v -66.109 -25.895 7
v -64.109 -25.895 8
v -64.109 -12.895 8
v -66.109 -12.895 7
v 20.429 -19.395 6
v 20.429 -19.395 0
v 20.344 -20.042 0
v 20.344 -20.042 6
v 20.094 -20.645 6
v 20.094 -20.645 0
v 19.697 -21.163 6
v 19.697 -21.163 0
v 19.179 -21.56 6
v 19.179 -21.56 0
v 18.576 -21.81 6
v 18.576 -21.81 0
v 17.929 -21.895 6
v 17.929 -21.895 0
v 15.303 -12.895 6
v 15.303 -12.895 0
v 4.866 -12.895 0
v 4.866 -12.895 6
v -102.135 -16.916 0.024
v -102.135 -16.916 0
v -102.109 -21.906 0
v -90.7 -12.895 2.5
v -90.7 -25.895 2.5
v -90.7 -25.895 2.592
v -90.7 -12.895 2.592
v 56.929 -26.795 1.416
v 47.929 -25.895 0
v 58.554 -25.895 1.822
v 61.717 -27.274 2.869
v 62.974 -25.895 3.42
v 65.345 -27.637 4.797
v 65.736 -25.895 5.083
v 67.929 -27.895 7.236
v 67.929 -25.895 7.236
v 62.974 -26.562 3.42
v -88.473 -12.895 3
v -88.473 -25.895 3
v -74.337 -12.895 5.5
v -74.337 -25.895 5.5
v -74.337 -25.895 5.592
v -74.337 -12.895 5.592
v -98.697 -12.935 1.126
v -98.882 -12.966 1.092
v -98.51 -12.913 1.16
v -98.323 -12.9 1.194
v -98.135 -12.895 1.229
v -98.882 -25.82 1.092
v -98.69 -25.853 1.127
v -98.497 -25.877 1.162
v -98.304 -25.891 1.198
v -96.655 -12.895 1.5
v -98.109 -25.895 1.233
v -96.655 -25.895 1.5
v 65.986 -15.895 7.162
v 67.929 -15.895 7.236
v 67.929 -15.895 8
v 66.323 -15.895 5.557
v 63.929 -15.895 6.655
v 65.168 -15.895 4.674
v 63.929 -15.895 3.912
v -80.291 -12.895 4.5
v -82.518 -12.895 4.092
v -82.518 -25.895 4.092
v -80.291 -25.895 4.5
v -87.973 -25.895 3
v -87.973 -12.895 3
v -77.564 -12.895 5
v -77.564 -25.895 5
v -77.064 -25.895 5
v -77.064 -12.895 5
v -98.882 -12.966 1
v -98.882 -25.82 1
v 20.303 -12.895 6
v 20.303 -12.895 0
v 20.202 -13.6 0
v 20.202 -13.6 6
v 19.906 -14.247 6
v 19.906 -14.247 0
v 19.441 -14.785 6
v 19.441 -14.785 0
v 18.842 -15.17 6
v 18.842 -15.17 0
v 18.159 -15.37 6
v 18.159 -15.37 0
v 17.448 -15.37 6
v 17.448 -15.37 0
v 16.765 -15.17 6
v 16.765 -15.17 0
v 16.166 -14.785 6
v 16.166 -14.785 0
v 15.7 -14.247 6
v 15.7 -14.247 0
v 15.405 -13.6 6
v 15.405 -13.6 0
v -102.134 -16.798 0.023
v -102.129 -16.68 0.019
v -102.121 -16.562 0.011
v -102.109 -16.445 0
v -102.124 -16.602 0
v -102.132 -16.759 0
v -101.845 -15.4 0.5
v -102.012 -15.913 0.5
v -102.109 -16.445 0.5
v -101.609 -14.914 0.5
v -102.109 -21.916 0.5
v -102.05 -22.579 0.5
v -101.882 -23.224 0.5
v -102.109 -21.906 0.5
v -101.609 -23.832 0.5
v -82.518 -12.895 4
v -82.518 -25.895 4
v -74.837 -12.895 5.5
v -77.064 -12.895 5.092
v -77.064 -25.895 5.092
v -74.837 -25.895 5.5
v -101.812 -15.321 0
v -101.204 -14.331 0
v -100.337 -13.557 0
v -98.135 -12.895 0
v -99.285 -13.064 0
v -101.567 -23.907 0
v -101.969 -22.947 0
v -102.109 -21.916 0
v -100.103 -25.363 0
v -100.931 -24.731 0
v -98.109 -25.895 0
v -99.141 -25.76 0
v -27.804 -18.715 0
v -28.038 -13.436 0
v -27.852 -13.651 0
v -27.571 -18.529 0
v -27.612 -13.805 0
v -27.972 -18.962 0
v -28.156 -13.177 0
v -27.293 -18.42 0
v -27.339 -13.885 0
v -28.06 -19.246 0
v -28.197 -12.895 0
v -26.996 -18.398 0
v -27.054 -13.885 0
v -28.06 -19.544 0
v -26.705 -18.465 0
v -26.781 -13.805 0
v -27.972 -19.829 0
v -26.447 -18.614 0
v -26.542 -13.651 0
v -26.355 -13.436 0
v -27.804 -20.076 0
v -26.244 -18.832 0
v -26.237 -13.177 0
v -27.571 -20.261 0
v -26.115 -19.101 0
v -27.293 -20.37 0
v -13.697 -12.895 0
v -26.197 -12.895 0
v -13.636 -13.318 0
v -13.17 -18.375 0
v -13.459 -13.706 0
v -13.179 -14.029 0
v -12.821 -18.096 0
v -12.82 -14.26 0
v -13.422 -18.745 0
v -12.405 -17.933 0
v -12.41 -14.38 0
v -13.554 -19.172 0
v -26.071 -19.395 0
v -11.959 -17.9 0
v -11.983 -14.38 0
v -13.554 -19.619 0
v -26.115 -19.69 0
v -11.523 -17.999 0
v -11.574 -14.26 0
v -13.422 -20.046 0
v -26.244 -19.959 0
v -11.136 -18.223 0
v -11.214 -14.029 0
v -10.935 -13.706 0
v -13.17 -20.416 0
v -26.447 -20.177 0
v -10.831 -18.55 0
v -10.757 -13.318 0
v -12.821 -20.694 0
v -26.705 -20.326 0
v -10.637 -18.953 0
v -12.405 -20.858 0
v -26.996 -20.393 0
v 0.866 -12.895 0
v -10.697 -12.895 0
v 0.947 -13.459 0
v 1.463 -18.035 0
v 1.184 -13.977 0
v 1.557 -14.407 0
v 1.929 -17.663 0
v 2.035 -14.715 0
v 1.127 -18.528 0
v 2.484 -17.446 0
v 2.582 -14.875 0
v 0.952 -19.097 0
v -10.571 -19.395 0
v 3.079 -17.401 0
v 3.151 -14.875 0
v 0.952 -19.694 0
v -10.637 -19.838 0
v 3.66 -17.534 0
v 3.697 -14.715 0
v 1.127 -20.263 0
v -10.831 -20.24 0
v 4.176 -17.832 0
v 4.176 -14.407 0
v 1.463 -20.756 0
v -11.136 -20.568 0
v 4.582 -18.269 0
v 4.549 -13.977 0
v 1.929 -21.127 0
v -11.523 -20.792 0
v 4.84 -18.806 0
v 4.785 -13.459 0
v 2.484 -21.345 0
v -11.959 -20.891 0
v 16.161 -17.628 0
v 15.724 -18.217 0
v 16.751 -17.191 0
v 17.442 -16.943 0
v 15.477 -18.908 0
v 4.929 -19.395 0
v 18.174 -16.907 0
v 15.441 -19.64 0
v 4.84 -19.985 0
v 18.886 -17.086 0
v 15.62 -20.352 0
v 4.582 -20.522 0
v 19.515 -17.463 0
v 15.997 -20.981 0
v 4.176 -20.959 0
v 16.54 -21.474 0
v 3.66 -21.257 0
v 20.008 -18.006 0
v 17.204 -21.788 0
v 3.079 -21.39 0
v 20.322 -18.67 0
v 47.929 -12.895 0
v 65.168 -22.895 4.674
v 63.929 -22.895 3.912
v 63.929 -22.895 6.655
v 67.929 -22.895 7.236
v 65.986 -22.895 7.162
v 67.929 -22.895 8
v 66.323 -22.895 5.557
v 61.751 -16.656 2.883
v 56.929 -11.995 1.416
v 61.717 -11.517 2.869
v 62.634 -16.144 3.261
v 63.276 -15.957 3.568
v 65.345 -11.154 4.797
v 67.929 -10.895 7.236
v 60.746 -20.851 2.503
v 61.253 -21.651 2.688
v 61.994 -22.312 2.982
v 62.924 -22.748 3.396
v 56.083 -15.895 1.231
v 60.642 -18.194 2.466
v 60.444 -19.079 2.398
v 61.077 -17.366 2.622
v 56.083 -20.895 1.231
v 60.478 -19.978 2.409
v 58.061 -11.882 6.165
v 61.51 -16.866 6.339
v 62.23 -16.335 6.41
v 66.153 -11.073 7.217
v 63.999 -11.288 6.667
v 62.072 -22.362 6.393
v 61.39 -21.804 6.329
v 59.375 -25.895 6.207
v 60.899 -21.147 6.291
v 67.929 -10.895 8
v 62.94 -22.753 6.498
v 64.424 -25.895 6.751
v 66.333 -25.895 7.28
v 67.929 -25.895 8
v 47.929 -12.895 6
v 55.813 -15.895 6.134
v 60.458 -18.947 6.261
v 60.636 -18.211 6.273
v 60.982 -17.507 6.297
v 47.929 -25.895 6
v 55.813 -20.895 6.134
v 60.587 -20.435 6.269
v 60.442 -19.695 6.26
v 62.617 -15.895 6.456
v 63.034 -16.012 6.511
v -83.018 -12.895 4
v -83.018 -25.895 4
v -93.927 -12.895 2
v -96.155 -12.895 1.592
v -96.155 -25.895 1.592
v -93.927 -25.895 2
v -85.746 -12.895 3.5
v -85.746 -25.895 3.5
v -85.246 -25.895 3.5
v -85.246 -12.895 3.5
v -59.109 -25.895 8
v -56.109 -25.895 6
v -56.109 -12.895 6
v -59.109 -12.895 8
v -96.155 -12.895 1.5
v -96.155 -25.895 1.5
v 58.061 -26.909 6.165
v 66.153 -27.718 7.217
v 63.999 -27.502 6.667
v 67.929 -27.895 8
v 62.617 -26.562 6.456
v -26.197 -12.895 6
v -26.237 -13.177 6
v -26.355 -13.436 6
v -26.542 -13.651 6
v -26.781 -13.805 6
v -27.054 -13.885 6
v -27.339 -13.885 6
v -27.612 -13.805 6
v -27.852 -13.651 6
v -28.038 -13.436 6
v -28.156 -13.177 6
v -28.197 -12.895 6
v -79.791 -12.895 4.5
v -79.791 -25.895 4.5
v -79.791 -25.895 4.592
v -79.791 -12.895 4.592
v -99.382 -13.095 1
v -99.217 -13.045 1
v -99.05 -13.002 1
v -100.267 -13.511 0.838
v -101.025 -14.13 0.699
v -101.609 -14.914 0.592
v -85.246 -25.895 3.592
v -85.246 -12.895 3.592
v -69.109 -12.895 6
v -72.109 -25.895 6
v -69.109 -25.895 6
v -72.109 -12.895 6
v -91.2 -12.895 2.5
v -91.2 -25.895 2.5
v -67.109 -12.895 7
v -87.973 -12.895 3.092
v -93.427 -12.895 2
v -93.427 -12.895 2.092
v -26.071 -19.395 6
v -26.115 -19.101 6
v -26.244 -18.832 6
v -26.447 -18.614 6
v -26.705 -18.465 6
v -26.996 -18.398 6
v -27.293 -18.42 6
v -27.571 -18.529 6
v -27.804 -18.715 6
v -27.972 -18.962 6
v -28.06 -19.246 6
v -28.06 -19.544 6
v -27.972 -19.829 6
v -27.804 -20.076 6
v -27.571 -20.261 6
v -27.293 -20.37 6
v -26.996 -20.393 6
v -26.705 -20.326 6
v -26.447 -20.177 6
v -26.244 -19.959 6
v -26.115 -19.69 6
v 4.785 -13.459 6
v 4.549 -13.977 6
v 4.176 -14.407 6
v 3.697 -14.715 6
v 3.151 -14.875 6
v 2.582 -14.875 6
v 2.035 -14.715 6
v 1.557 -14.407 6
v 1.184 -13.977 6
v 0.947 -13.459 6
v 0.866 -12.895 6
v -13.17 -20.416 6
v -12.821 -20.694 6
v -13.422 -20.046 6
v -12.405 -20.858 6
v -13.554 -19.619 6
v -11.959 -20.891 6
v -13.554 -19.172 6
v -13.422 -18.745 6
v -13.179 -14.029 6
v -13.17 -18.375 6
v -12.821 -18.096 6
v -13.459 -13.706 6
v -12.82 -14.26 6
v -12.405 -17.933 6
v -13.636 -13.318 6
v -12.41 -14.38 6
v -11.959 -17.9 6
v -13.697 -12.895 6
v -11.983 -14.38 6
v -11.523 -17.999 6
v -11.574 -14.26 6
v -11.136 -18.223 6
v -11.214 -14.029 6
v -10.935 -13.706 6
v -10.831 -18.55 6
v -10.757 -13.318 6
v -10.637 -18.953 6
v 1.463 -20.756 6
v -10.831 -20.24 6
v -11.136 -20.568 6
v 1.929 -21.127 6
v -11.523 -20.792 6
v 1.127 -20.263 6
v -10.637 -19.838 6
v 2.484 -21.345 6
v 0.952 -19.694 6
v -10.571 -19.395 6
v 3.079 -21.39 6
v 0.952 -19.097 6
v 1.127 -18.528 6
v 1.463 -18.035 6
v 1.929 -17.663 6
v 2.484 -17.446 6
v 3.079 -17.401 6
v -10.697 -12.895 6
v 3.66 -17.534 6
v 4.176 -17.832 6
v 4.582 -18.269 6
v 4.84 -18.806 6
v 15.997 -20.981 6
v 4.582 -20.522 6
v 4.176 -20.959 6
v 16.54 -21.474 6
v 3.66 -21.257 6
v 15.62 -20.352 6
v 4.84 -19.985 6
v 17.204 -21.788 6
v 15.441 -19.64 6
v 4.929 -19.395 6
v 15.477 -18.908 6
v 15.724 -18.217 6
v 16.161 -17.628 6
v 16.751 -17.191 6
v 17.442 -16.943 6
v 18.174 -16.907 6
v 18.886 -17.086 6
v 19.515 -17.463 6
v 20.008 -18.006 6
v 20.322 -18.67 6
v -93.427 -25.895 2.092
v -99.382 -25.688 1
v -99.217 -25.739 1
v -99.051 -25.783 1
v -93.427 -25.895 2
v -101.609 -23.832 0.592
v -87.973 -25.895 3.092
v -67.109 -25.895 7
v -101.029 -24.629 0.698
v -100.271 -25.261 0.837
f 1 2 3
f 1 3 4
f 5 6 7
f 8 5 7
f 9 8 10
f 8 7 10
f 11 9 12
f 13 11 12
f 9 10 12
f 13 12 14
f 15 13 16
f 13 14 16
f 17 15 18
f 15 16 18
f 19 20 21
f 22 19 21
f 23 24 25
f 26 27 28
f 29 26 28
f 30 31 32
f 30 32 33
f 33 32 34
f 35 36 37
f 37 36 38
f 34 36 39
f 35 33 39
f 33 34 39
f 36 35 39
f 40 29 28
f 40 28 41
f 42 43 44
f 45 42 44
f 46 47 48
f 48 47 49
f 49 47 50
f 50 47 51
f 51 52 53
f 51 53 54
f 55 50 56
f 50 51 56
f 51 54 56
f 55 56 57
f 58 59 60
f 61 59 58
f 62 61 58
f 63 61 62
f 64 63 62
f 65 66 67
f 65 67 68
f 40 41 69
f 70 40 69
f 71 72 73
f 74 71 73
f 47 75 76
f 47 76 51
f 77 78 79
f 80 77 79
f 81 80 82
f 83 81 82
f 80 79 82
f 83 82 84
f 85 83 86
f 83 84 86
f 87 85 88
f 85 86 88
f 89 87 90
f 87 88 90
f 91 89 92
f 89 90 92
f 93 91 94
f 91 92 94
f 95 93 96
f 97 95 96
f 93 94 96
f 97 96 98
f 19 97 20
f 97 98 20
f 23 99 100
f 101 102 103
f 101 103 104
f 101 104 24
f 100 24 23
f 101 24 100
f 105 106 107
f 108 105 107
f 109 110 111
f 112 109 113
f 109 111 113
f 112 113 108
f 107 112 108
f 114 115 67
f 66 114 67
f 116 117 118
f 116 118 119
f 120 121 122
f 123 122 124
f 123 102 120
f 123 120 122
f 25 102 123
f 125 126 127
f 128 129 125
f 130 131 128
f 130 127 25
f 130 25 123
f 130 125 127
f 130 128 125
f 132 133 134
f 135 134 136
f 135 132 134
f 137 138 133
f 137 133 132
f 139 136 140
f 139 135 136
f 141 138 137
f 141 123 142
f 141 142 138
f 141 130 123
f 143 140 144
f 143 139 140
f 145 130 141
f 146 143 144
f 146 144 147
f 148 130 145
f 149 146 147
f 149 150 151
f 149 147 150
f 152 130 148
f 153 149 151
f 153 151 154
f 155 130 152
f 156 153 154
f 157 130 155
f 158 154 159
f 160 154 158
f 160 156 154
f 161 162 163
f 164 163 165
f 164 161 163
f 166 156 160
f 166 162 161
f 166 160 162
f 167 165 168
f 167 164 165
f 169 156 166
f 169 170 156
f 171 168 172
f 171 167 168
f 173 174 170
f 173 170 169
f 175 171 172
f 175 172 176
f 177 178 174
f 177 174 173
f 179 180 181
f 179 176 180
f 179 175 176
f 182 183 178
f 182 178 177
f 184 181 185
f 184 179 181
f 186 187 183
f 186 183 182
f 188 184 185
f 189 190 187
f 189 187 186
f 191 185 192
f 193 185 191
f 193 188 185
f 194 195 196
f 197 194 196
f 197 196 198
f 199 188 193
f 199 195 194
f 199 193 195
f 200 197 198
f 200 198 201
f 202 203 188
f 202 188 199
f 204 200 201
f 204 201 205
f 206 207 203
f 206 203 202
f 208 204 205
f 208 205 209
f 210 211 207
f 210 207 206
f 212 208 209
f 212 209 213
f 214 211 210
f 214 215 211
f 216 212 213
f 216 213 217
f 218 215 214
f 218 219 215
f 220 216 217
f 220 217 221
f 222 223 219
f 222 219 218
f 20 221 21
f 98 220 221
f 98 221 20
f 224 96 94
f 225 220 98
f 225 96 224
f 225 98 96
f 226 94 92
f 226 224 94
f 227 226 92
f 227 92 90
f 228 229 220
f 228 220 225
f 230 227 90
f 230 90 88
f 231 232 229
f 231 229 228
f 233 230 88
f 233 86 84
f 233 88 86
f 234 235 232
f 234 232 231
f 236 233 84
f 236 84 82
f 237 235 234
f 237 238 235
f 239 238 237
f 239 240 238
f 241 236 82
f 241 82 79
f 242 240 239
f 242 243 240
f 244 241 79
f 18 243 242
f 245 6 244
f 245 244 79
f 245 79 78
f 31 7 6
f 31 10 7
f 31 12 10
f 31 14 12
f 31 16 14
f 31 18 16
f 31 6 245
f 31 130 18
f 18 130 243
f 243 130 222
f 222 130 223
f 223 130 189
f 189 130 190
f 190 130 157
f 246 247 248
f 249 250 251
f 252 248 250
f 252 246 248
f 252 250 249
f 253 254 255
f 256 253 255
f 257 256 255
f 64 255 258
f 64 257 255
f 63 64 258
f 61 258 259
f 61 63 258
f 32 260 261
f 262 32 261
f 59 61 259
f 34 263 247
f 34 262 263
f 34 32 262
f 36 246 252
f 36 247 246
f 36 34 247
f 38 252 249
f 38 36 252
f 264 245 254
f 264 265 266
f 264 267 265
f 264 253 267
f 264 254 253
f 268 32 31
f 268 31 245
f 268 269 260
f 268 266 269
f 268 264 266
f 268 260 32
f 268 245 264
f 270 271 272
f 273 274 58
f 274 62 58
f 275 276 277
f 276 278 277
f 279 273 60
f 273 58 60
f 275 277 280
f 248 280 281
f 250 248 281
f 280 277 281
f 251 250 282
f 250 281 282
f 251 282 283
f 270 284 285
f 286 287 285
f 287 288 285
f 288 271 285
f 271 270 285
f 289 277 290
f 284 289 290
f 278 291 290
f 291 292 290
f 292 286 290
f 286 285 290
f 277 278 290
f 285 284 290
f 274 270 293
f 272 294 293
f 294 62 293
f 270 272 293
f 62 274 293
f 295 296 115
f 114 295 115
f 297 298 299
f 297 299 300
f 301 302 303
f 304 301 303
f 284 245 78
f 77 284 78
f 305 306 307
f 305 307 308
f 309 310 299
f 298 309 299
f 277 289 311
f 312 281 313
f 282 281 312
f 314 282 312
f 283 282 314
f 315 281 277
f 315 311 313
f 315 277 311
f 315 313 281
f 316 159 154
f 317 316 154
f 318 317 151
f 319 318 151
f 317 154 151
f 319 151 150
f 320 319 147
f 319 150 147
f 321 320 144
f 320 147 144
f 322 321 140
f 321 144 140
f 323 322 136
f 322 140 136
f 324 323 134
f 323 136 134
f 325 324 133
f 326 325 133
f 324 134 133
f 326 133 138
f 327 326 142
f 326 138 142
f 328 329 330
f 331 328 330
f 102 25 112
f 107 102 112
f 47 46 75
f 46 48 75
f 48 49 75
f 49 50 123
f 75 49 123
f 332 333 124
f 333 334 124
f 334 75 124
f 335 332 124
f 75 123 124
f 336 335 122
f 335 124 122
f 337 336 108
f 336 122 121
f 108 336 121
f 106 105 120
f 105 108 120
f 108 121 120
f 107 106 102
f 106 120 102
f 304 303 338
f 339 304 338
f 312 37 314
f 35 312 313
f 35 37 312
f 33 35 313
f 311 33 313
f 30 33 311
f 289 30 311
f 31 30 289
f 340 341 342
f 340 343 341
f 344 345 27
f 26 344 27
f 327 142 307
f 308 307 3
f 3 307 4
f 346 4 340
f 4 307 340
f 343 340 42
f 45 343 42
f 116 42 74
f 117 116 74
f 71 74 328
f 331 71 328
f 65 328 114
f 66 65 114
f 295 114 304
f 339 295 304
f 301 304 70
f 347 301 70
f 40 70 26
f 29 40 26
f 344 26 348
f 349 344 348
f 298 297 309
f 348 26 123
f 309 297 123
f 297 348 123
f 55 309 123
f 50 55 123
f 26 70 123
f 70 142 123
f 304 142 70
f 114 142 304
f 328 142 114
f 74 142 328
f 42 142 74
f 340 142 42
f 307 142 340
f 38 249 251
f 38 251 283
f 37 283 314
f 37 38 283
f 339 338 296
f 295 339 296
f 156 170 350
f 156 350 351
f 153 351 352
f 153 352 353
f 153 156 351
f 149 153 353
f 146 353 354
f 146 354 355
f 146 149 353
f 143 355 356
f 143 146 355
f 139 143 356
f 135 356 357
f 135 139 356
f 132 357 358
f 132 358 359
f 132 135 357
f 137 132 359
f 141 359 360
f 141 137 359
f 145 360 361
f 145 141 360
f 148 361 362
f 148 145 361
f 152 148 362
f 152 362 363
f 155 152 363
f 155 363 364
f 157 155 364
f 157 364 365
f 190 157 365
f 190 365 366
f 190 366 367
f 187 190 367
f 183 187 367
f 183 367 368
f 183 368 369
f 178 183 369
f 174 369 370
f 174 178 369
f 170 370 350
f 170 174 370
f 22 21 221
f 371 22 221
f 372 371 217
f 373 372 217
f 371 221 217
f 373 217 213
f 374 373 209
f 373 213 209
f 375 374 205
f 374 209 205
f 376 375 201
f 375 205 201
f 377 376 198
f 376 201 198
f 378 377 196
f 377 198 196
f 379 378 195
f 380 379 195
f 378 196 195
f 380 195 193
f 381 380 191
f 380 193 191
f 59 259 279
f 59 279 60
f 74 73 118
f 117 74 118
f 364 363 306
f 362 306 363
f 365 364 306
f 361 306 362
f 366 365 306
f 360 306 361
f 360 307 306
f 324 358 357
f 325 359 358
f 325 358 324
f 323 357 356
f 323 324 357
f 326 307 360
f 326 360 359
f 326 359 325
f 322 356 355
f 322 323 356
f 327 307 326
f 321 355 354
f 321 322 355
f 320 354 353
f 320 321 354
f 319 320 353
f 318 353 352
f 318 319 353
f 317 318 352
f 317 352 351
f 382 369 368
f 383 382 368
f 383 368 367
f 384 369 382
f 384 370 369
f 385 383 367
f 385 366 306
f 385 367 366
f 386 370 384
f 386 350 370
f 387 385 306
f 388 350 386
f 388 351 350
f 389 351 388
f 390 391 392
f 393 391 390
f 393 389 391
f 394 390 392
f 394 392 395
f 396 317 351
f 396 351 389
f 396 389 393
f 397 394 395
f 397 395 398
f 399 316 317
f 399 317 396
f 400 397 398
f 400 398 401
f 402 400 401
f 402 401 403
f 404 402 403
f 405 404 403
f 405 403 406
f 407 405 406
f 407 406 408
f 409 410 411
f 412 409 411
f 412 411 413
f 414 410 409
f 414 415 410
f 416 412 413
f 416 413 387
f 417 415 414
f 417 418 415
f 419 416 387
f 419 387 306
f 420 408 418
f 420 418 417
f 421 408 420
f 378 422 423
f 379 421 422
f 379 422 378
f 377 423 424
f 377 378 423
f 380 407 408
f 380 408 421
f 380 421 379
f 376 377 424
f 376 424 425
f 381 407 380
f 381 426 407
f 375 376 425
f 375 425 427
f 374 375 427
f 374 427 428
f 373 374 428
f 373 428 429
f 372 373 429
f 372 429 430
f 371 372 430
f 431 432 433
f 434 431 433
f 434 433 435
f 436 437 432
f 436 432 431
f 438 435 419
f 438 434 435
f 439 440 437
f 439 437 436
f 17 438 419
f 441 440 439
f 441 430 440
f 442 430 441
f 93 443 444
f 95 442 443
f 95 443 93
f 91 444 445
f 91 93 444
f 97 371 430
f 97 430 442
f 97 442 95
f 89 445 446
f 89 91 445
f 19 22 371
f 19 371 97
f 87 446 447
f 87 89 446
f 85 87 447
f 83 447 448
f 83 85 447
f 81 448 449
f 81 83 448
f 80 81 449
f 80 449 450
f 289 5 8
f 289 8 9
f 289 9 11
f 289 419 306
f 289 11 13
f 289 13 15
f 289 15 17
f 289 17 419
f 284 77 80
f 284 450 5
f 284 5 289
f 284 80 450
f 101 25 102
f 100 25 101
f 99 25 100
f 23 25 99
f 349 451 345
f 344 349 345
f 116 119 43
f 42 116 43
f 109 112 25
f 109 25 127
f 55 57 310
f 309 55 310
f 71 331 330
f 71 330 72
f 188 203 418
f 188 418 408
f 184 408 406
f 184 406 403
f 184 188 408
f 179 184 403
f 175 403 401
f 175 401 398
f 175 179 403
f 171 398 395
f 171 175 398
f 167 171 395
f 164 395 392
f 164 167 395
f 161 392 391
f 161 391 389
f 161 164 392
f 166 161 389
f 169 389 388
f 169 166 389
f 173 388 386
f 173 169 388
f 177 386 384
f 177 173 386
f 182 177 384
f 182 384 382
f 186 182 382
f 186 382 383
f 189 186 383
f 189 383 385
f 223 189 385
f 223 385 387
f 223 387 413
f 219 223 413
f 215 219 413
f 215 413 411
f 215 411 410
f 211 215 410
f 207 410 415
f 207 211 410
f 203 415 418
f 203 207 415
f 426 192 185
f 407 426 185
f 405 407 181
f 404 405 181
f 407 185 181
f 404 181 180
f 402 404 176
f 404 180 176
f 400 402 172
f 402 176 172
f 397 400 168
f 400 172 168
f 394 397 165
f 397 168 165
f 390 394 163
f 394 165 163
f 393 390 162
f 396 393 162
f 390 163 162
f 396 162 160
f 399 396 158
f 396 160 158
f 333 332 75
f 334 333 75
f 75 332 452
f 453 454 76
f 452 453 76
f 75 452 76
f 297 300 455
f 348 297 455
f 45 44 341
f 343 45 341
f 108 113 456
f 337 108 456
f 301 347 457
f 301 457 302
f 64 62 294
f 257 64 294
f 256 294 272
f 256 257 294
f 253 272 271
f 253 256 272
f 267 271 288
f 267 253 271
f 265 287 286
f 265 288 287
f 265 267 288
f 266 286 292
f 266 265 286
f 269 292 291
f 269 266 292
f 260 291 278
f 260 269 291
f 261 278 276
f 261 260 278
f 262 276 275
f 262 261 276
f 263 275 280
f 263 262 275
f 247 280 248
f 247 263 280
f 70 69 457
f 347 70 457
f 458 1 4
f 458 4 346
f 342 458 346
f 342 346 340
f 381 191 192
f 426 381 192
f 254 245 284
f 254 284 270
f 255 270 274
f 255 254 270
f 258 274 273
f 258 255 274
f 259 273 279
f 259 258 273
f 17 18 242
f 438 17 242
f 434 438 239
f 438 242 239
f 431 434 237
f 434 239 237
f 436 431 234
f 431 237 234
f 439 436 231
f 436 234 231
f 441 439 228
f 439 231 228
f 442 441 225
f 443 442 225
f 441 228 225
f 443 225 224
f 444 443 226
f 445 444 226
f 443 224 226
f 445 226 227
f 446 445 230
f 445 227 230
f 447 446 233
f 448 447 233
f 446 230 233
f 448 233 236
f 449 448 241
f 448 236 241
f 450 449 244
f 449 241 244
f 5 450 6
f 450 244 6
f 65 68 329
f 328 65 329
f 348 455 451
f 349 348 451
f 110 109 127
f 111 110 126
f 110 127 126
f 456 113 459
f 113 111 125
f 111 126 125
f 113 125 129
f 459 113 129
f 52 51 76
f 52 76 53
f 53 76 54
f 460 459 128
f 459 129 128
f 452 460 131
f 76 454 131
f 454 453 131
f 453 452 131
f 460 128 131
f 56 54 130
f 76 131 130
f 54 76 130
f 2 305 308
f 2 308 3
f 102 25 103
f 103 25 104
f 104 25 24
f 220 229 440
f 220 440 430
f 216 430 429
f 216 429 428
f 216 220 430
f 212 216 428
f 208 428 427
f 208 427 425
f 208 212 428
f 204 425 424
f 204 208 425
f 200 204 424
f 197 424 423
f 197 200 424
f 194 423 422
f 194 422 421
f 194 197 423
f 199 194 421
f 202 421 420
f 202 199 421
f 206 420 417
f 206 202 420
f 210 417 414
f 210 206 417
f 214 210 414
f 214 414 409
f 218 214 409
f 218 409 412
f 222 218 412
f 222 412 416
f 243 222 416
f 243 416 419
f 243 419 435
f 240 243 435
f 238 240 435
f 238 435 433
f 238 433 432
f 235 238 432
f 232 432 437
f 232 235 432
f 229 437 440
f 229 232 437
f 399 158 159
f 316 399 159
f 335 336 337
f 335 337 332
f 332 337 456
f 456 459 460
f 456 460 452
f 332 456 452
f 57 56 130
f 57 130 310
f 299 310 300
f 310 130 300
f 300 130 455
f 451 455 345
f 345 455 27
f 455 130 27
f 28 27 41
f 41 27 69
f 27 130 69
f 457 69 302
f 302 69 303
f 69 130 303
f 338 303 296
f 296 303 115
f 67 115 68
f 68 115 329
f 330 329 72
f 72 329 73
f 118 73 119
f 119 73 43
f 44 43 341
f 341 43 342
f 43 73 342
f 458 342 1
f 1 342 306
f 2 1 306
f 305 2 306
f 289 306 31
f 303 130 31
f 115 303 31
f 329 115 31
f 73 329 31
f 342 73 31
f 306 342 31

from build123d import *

# Parameters (mm, degrees)
F0_R          = 1
F0_R_2        = 1.5
F0_R_3        = 2
F1_DEPTH      = 6
F3_DEPTH      = 8
F5_DEPTH      = 25
F5_DEPTH_BACK = 25
F7_DEPTH      = 25
F9_DEPTH      = 13


# Not quite as in the source:
# - a feature names something its author has since deleted; it is built from what else it names


with BuildPart() as f1:
    # F0 (on Top) → F1 (new body)
    with BuildSketch(Plane.XY):
        with BuildLine():
            Line((-42.1966487169, -12.8954221606), (-42.1966487169, -25.8954221606))
            Line((-42.1966487169, -25.8954221606), (17.9292613268, -25.8954221606))
            Line((17.9292613268, -25.8954221606), (47.9292613268, -25.8954221606))
            Line((47.9292613268, -25.8954221606), (47.9292613268, -12.8954221606))
            Line((47.9292613268, -12.8954221606), (20.3033512831, -12.8954221606))
            ThreePointArc((20.3033512831, -12.8954221606), (17.8033512831, -15.3954221606), (15.3033512831, -12.8954221606))
            Line((15.3033512831, -12.8954221606), (4.8663063049, -12.8954221606))
            ThreePointArc((4.8663063049, -12.8954221606), (2.8663063049, -14.8954221606), (0.8663063049, -12.8954221606))
            Line((0.8663063049, -12.8954221606), (-10.6966487169, -12.8954221606))
            ThreePointArc((-10.6966487169, -12.8954221606), (-12.1966487169, -14.3954221606), (-13.6966487169, -12.8954221606))
            Line((-13.6966487169, -12.8954221606), (-26.1966487169, -12.8954221606))
            ThreePointArc((-26.1966487169, -12.8954221606), (-27.1966487169, -13.8954221606), (-28.1966487169, -12.8954221606))
            Line((-28.1966487169, -12.8954221606), (-42.1966487169, -12.8954221606))
        make_face()
        with Locations((-27.0707386732, -19.3954221606)):
            Circle(F0_R, mode=Mode.SUBTRACT)
        with Locations((-12.0707386732, -19.3954221606)):
            Circle(F0_R_2, mode=Mode.SUBTRACT)
        with Locations((2.9292613268, -19.3954221606)):
            Circle(F0_R_3, mode=Mode.SUBTRACT)
        with BuildLine():
            ThreePointArc((20.4292613268, -19.3954221606), (19.6970282798, -21.1631891136), (17.9292613268, -21.8954221606))
            ThreePointArc((17.9292613268, -21.8954221606), (16.1614943738, -17.6276552077), (20.4292613268, -19.3954221606))
        make_face(mode=Mode.SUBTRACT)
        with BuildLine():
            ThreePointArc((-102.1092408178, -21.9157785711), (-100.9305134828, -24.7310372299), (-98.109292616, -25.8954221606))
            Line((-98.109292616, -25.8954221606), (-42.1966487169, -25.8954221606))
            Line((-42.1966487169, -25.8954221606), (-42.1966487169, -12.8954221606))
            Line((-42.1966487169, -12.8954221606), (-98.1347384587, -12.8954221606))
            ThreePointArc((-98.1347384587, -12.8954221606), (-100.9703535279, -14.0742012939), (-102.1346866604, -16.9157785711))
            Line((-102.1346866604, -16.9157785711), (-102.1092408178, -21.9157785711))
        make_face()
    extrude(amount=F1_DEPTH)

    # F2 (on face) → F3 (join)
    with BuildSketch(Plane(origin=(0, 0, 0), x_dir=(1, 0, 0), z_dir=(0, 0, -1))):
        with BuildLine():
            Line((47.9292613268, 25.8954221606), (47.9292613268, 12.8954221606))
            Line((47.9292613268, 12.8954221606), (67.9292613268, 10.8954221606))
            Line((67.9292613268, 10.8954221606), (67.9292613268, 15.8954221606))
            Line((67.9292613268, 15.8954221606), (63.9292613268, 15.8954221606))
            ThreePointArc((63.9292613268, 15.8954221606), (60.4292613268, 19.3954221606), (63.9292613268, 22.8954221606))
            Line((63.9292613268, 22.8954221606), (67.9292613268, 22.8954221606))
            Line((67.9292613268, 22.8954221606), (67.9292613268, 27.8954221606))
            Line((67.9292613268, 27.8954221606), (47.9292613268, 25.8954221606))
        make_face()
    extrude(amount=-F3_DEPTH)

    # F4 (on face) → F5 (cut, two sides)
    with BuildSketch(Plane.XZ.offset(25.8954221606)) as f5_sk:
        with BuildLine():
            Line((46.540889889, 6), (47.9292613268, 6))
            add(Edge.make_bspline(
                [(47.9292613268, 6), (56.2153583024, 6.3852668293), (63.4993069571, 5.4990063105), (67.9292613268, 8)],
                knots=[0, 0, 0, 0, 0.5891408943, 0.5891408943, 0.5891408943, 0.5891408943], degree=3))
            add(Edge.make_bspline(
                [(67.9292613268, 8), (68.2487173743, 8.1803534511), (68.5533319552, 8.3783214507), (68.8425013824, 8.5922158425)],
                knots=[0.5891408943, 0.5891408943, 0.5891408943, 0.5891408943, 0.6316254451, 0.6316254451, 0.6316254451, 0.6316254451], degree=3))
            add(Edge.make_bspline(
                [(68.8425013824, 8.5922158425), (70.5907749543, 11.5561393325), (71.3452296215, 15.074575864), (72.5077323308, 15.8934572506)],
                knots=[0.4687959677, 0.4687959677, 0.4687959677, 0.4687959677, 0.7089887452, 0.7089887452, 0.7089887452, 0.7089887452], degree=3))
            add(Edge.make_bspline(
                [(72.5077323308, 15.8934572506), (72.5145030374, 15.8982266206), (72.5212875857, 15.9029044167), (72.5280862528, 15.9074899958)],
                knots=[0.7089887452, 0.7089887452, 0.7089887452, 0.7089887452, 0.710387688, 0.710387688, 0.710387688, 0.710387688], degree=3))
            Line((72.5280862528, 15.9074899958), (72.5280862528, 21.5322930813))
            Line((72.5280862528, 21.5322930813), (47.9292613268, 21.5322930813))
            Line((47.9292613268, 21.5322930813), (46.540889889, 21.5322930813))
            Line((46.540889889, 21.5322930813), (46.540889889, 6))
        make_face()
        with BuildLine():
            add(Edge.make_bspline(
                [(47.9292613268, 0), (56.4914134681, 0.9755749136), (64.1655487647, 2.3840198172), (67.9292613268, 7.2357458994)],
                knots=[0, 0, 0, 0, 0.4306699839, 0.4306699839, 0.4306699839, 0.4306699839], degree=3))
            Line((47.9292613268, 0), (47.9292613268, -3.928697668))
            Line((47.9292613268, -3.928697668), (72.5280862528, -3.928697668))
            Line((72.5280862528, -3.928697668), (72.5280862528, 15.9074899958))
            add(Edge.make_bspline(
                [(72.5077323308, 15.8934572506), (72.5145030374, 15.8982266206), (72.5212875857, 15.9029044167), (72.5280862528, 15.9074899958)],
                knots=[0.7089887452, 0.7089887452, 0.7089887452, 0.7089887452, 0.710387688, 0.710387688, 0.710387688, 0.710387688], degree=3))
            add(Edge.make_bspline(
                [(68.8425013824, 8.5922158425), (71.1489726079, 10.2982788409), (72.4728284355, 13.0175734735), (72.5077323308, 15.8934572506)],
                knots=[0.6316254451, 0.6316254451, 0.6316254451, 0.6316254451, 0.9704904314, 0.9704904314, 0.9704904314, 0.9704904314], degree=3))
            add(Edge.make_bspline(
                [(67.9292613268, 7.2357458994), (68.2624520517, 7.6652553541), (68.5649965775, 8.1217499937), (68.8425013824, 8.5922158425)],
                knots=[0.4306699839, 0.4306699839, 0.4306699839, 0.4306699839, 0.4687959677, 0.4687959677, 0.4687959677, 0.4687959677], degree=3))
        make_face()
    extrude(amount=-F5_DEPTH, mode=Mode.SUBTRACT)
    extrude(f5_sk.sketch, amount=F5_DEPTH_BACK, mode=Mode.SUBTRACT)

    # F6 (on face) → F7 (cut)
    with BuildSketch(Plane.XZ.offset(25.8954221606)):
        Polygon((-110.3505343199, 7.7635785565), (-102.109292616, 0), (-102.109292616, 0.5), (-101.609292616, 0.5), (-101.609292616, 0.5916666667), (-99.3820198888, 1), (-98.8820198888, 1), (-98.8820198888, 1.0916666667), (-96.6547471615, 1.5), (-96.1547471615, 1.5), (-96.1547471615, 1.5916666667), (-93.9274744342, 2), (-93.4274744342, 2), (-93.4274744342, 2.0916666667), (-91.200201707, 2.5), (-90.700201707, 2.5), (-90.700201707, 2.5916666667), (-88.4729289797, 3), (-87.9729289797, 3), (-87.9729289797, 3.0916666667), (-85.7456562524, 3.5), (-85.2456562524, 3.5), (-85.2456562524, 3.5916666667), (-83.0183835251, 4), (-82.5183835251, 4), (-82.5183835251, 4.0916666667), (-80.2911107979, 4.5), (-79.7911107979, 4.5), (-79.7911107979, 4.5916666667), (-77.5638380706, 5), (-77.0638380706, 5), (-77.0638380706, 5.0916666667), (-74.8365653433, 5.5), (-74.3365653433, 5.5), (-74.3365653433, 5.5916666667), (-72.109292616, 6), (-71.3678747416, 6.6357897595), (-76.816663146, 6.5958285704), (-98.5576808453, 7.7635785565), align=None)
    extrude(amount=-F7_DEPTH, mode=Mode.SUBTRACT)

    # F8 (on face) → F9 (join)
    with BuildSketch(Plane.XZ.offset(25.8954221606)):
        Polygon((-67.109292616, 7), (-69.109292616, 6), (-67.109292616, 6), (-56.109292616, 6), (-59.109292616, 8), (-64.109292616, 8), (-66.109292616, 7), align=None)
    extrude(amount=-F9_DEPTH)


solid = f1.part
